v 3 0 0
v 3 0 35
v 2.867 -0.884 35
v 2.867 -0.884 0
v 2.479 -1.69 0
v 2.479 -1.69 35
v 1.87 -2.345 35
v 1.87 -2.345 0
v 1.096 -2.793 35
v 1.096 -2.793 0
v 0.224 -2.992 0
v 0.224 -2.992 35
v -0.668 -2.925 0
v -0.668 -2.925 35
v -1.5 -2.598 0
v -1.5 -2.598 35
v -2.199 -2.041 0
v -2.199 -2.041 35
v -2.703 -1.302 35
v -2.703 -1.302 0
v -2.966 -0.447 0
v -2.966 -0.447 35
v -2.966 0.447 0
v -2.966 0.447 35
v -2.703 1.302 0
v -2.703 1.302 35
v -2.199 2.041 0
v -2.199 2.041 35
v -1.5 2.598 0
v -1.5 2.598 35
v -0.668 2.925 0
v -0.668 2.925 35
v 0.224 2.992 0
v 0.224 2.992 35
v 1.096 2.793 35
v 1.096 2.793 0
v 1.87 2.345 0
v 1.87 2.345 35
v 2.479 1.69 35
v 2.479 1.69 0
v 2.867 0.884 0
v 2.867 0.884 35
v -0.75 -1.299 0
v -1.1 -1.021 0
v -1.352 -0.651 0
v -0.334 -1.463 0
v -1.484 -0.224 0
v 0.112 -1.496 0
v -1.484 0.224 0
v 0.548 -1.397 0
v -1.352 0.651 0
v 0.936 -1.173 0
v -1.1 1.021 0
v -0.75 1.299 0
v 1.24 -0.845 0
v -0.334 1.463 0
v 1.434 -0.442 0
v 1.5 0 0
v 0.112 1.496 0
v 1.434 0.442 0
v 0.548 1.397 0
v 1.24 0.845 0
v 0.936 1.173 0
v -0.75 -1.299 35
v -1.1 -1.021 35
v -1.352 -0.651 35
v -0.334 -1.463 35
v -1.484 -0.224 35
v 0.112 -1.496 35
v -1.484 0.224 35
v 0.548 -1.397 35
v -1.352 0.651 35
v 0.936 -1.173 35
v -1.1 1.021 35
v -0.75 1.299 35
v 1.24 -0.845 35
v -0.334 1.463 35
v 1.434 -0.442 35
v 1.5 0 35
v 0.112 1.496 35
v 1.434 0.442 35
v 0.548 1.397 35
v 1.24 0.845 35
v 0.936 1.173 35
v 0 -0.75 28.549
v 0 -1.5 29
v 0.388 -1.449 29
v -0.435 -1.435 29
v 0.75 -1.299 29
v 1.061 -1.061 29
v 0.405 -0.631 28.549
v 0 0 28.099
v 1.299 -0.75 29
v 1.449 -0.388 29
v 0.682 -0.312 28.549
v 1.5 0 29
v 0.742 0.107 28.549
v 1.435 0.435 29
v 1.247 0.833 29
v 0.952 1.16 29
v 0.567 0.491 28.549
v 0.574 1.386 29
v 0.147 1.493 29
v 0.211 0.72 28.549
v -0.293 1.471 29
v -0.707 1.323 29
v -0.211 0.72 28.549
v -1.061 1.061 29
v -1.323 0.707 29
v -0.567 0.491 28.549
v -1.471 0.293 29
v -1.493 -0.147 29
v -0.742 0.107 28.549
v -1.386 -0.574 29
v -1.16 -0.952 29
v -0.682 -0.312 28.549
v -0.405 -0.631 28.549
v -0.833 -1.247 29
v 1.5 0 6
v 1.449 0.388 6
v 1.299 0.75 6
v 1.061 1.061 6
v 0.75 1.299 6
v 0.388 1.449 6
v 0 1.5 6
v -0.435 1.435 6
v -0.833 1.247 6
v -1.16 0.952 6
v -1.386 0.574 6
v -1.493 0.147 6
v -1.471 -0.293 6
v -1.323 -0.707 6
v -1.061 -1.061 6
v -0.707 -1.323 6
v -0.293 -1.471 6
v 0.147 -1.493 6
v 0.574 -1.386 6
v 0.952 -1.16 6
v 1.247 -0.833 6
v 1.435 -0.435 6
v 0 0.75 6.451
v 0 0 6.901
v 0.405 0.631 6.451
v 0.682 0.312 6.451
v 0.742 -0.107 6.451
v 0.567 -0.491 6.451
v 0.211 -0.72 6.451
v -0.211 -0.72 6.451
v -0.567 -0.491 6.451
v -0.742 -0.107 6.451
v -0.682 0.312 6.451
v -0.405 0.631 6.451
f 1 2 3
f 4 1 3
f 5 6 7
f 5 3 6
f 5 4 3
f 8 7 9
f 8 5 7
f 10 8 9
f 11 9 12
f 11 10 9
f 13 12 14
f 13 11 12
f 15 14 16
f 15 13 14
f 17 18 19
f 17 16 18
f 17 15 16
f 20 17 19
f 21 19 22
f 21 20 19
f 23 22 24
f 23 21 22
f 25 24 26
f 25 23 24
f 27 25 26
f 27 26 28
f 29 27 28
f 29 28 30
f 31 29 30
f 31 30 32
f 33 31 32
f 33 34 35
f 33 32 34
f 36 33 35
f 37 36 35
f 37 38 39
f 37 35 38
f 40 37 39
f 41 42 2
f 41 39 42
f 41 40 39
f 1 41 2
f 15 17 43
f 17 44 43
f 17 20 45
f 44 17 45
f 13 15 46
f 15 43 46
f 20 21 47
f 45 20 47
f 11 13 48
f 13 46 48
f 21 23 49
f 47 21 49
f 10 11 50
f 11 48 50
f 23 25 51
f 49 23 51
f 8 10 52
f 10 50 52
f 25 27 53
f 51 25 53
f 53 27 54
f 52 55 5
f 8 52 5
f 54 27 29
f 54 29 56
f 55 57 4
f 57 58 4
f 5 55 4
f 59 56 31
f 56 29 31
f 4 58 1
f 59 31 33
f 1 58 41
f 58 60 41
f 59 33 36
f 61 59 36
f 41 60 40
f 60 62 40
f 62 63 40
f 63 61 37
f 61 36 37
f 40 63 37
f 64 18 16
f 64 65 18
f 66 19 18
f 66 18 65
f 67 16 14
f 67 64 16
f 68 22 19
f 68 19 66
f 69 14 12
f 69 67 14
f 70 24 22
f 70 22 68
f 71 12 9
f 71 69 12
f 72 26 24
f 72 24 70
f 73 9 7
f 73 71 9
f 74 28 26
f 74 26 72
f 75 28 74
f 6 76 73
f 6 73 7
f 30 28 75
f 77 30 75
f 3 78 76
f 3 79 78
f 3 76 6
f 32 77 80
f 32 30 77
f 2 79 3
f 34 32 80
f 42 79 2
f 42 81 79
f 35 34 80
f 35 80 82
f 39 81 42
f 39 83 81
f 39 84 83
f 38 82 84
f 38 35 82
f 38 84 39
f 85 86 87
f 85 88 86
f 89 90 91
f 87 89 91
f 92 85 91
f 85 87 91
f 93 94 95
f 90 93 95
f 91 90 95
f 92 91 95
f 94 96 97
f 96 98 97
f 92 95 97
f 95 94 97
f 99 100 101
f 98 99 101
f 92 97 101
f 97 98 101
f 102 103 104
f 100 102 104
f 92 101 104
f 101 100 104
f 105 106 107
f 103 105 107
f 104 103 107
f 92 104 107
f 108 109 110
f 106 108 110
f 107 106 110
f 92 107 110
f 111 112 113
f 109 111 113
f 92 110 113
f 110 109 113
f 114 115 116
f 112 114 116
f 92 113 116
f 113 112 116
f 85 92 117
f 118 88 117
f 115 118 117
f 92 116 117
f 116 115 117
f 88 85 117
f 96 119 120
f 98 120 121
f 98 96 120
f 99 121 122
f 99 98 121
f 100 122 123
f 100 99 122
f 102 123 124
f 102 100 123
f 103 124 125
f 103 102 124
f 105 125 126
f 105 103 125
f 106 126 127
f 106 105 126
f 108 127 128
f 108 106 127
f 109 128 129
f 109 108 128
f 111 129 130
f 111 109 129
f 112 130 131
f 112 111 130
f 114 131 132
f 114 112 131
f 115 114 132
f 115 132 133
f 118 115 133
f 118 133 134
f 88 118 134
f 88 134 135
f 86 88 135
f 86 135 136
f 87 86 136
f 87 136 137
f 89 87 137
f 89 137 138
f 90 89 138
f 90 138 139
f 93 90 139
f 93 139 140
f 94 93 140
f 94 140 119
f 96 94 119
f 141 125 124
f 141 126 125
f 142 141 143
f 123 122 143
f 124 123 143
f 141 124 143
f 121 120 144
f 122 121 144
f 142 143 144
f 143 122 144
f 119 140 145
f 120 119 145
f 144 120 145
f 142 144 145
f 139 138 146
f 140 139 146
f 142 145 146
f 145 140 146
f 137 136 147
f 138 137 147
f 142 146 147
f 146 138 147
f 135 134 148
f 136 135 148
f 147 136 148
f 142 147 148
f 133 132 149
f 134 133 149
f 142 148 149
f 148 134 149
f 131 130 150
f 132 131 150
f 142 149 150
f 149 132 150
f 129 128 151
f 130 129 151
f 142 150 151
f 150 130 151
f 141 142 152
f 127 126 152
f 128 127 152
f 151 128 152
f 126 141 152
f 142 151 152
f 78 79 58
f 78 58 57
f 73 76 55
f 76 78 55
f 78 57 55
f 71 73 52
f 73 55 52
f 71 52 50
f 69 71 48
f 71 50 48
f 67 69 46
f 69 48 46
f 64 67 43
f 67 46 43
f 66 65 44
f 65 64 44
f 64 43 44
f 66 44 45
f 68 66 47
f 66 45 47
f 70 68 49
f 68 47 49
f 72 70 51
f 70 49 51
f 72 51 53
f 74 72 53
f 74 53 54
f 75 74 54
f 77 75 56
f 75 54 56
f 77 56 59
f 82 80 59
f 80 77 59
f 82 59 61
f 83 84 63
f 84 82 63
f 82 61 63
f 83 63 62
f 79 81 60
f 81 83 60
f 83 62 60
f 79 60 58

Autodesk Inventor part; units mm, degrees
ref_plane "YZ Plane" through (0, 0, 0) normal (1, 0, 0) x (0, 1, 0)
ref_plane "XZ Plane" through (0, 0, 0) normal (0, 1, 0) x (-1, 0, 0)
ref_plane "XY Plane" through (0, 0, 0) normal (0, 0, 1) x (1, 0, 0)
sketch "スケッチ1" plane through (0, 0, 0) normal (0, 0, 1) x (1, 0, 0)
  circle A0 centre (0, 0) radius 3
  circle A1 centre (0, 0) radius 1.5005
  dimension "d0" = 6
  dimension "d1" = 3.001
extrude "押し出し1" add sketch "スケッチ1" along normal blind 35
sketch "スケッチ2" plane through (0, 0, 35) normal (0, 0, 1) x (1, 0, 0)
  circle A0 centre (0, 0) radius 1.5
  dimension "d4" = 3
extrude "押し出し2" add sketch "スケッチ2" against normal blind 35
hole "穴1" at (0, 0, 35) direction (0, 0, -1) diameter 3 depth 6 tip angle 118
hole "穴2" at (0, 0, 0) direction (0, 0, 1) diameter 3 depth 6 tip angle 118
properties part number "スペーサーm3-35　簡易筒型" material "アルミニウム 2014-T4"
